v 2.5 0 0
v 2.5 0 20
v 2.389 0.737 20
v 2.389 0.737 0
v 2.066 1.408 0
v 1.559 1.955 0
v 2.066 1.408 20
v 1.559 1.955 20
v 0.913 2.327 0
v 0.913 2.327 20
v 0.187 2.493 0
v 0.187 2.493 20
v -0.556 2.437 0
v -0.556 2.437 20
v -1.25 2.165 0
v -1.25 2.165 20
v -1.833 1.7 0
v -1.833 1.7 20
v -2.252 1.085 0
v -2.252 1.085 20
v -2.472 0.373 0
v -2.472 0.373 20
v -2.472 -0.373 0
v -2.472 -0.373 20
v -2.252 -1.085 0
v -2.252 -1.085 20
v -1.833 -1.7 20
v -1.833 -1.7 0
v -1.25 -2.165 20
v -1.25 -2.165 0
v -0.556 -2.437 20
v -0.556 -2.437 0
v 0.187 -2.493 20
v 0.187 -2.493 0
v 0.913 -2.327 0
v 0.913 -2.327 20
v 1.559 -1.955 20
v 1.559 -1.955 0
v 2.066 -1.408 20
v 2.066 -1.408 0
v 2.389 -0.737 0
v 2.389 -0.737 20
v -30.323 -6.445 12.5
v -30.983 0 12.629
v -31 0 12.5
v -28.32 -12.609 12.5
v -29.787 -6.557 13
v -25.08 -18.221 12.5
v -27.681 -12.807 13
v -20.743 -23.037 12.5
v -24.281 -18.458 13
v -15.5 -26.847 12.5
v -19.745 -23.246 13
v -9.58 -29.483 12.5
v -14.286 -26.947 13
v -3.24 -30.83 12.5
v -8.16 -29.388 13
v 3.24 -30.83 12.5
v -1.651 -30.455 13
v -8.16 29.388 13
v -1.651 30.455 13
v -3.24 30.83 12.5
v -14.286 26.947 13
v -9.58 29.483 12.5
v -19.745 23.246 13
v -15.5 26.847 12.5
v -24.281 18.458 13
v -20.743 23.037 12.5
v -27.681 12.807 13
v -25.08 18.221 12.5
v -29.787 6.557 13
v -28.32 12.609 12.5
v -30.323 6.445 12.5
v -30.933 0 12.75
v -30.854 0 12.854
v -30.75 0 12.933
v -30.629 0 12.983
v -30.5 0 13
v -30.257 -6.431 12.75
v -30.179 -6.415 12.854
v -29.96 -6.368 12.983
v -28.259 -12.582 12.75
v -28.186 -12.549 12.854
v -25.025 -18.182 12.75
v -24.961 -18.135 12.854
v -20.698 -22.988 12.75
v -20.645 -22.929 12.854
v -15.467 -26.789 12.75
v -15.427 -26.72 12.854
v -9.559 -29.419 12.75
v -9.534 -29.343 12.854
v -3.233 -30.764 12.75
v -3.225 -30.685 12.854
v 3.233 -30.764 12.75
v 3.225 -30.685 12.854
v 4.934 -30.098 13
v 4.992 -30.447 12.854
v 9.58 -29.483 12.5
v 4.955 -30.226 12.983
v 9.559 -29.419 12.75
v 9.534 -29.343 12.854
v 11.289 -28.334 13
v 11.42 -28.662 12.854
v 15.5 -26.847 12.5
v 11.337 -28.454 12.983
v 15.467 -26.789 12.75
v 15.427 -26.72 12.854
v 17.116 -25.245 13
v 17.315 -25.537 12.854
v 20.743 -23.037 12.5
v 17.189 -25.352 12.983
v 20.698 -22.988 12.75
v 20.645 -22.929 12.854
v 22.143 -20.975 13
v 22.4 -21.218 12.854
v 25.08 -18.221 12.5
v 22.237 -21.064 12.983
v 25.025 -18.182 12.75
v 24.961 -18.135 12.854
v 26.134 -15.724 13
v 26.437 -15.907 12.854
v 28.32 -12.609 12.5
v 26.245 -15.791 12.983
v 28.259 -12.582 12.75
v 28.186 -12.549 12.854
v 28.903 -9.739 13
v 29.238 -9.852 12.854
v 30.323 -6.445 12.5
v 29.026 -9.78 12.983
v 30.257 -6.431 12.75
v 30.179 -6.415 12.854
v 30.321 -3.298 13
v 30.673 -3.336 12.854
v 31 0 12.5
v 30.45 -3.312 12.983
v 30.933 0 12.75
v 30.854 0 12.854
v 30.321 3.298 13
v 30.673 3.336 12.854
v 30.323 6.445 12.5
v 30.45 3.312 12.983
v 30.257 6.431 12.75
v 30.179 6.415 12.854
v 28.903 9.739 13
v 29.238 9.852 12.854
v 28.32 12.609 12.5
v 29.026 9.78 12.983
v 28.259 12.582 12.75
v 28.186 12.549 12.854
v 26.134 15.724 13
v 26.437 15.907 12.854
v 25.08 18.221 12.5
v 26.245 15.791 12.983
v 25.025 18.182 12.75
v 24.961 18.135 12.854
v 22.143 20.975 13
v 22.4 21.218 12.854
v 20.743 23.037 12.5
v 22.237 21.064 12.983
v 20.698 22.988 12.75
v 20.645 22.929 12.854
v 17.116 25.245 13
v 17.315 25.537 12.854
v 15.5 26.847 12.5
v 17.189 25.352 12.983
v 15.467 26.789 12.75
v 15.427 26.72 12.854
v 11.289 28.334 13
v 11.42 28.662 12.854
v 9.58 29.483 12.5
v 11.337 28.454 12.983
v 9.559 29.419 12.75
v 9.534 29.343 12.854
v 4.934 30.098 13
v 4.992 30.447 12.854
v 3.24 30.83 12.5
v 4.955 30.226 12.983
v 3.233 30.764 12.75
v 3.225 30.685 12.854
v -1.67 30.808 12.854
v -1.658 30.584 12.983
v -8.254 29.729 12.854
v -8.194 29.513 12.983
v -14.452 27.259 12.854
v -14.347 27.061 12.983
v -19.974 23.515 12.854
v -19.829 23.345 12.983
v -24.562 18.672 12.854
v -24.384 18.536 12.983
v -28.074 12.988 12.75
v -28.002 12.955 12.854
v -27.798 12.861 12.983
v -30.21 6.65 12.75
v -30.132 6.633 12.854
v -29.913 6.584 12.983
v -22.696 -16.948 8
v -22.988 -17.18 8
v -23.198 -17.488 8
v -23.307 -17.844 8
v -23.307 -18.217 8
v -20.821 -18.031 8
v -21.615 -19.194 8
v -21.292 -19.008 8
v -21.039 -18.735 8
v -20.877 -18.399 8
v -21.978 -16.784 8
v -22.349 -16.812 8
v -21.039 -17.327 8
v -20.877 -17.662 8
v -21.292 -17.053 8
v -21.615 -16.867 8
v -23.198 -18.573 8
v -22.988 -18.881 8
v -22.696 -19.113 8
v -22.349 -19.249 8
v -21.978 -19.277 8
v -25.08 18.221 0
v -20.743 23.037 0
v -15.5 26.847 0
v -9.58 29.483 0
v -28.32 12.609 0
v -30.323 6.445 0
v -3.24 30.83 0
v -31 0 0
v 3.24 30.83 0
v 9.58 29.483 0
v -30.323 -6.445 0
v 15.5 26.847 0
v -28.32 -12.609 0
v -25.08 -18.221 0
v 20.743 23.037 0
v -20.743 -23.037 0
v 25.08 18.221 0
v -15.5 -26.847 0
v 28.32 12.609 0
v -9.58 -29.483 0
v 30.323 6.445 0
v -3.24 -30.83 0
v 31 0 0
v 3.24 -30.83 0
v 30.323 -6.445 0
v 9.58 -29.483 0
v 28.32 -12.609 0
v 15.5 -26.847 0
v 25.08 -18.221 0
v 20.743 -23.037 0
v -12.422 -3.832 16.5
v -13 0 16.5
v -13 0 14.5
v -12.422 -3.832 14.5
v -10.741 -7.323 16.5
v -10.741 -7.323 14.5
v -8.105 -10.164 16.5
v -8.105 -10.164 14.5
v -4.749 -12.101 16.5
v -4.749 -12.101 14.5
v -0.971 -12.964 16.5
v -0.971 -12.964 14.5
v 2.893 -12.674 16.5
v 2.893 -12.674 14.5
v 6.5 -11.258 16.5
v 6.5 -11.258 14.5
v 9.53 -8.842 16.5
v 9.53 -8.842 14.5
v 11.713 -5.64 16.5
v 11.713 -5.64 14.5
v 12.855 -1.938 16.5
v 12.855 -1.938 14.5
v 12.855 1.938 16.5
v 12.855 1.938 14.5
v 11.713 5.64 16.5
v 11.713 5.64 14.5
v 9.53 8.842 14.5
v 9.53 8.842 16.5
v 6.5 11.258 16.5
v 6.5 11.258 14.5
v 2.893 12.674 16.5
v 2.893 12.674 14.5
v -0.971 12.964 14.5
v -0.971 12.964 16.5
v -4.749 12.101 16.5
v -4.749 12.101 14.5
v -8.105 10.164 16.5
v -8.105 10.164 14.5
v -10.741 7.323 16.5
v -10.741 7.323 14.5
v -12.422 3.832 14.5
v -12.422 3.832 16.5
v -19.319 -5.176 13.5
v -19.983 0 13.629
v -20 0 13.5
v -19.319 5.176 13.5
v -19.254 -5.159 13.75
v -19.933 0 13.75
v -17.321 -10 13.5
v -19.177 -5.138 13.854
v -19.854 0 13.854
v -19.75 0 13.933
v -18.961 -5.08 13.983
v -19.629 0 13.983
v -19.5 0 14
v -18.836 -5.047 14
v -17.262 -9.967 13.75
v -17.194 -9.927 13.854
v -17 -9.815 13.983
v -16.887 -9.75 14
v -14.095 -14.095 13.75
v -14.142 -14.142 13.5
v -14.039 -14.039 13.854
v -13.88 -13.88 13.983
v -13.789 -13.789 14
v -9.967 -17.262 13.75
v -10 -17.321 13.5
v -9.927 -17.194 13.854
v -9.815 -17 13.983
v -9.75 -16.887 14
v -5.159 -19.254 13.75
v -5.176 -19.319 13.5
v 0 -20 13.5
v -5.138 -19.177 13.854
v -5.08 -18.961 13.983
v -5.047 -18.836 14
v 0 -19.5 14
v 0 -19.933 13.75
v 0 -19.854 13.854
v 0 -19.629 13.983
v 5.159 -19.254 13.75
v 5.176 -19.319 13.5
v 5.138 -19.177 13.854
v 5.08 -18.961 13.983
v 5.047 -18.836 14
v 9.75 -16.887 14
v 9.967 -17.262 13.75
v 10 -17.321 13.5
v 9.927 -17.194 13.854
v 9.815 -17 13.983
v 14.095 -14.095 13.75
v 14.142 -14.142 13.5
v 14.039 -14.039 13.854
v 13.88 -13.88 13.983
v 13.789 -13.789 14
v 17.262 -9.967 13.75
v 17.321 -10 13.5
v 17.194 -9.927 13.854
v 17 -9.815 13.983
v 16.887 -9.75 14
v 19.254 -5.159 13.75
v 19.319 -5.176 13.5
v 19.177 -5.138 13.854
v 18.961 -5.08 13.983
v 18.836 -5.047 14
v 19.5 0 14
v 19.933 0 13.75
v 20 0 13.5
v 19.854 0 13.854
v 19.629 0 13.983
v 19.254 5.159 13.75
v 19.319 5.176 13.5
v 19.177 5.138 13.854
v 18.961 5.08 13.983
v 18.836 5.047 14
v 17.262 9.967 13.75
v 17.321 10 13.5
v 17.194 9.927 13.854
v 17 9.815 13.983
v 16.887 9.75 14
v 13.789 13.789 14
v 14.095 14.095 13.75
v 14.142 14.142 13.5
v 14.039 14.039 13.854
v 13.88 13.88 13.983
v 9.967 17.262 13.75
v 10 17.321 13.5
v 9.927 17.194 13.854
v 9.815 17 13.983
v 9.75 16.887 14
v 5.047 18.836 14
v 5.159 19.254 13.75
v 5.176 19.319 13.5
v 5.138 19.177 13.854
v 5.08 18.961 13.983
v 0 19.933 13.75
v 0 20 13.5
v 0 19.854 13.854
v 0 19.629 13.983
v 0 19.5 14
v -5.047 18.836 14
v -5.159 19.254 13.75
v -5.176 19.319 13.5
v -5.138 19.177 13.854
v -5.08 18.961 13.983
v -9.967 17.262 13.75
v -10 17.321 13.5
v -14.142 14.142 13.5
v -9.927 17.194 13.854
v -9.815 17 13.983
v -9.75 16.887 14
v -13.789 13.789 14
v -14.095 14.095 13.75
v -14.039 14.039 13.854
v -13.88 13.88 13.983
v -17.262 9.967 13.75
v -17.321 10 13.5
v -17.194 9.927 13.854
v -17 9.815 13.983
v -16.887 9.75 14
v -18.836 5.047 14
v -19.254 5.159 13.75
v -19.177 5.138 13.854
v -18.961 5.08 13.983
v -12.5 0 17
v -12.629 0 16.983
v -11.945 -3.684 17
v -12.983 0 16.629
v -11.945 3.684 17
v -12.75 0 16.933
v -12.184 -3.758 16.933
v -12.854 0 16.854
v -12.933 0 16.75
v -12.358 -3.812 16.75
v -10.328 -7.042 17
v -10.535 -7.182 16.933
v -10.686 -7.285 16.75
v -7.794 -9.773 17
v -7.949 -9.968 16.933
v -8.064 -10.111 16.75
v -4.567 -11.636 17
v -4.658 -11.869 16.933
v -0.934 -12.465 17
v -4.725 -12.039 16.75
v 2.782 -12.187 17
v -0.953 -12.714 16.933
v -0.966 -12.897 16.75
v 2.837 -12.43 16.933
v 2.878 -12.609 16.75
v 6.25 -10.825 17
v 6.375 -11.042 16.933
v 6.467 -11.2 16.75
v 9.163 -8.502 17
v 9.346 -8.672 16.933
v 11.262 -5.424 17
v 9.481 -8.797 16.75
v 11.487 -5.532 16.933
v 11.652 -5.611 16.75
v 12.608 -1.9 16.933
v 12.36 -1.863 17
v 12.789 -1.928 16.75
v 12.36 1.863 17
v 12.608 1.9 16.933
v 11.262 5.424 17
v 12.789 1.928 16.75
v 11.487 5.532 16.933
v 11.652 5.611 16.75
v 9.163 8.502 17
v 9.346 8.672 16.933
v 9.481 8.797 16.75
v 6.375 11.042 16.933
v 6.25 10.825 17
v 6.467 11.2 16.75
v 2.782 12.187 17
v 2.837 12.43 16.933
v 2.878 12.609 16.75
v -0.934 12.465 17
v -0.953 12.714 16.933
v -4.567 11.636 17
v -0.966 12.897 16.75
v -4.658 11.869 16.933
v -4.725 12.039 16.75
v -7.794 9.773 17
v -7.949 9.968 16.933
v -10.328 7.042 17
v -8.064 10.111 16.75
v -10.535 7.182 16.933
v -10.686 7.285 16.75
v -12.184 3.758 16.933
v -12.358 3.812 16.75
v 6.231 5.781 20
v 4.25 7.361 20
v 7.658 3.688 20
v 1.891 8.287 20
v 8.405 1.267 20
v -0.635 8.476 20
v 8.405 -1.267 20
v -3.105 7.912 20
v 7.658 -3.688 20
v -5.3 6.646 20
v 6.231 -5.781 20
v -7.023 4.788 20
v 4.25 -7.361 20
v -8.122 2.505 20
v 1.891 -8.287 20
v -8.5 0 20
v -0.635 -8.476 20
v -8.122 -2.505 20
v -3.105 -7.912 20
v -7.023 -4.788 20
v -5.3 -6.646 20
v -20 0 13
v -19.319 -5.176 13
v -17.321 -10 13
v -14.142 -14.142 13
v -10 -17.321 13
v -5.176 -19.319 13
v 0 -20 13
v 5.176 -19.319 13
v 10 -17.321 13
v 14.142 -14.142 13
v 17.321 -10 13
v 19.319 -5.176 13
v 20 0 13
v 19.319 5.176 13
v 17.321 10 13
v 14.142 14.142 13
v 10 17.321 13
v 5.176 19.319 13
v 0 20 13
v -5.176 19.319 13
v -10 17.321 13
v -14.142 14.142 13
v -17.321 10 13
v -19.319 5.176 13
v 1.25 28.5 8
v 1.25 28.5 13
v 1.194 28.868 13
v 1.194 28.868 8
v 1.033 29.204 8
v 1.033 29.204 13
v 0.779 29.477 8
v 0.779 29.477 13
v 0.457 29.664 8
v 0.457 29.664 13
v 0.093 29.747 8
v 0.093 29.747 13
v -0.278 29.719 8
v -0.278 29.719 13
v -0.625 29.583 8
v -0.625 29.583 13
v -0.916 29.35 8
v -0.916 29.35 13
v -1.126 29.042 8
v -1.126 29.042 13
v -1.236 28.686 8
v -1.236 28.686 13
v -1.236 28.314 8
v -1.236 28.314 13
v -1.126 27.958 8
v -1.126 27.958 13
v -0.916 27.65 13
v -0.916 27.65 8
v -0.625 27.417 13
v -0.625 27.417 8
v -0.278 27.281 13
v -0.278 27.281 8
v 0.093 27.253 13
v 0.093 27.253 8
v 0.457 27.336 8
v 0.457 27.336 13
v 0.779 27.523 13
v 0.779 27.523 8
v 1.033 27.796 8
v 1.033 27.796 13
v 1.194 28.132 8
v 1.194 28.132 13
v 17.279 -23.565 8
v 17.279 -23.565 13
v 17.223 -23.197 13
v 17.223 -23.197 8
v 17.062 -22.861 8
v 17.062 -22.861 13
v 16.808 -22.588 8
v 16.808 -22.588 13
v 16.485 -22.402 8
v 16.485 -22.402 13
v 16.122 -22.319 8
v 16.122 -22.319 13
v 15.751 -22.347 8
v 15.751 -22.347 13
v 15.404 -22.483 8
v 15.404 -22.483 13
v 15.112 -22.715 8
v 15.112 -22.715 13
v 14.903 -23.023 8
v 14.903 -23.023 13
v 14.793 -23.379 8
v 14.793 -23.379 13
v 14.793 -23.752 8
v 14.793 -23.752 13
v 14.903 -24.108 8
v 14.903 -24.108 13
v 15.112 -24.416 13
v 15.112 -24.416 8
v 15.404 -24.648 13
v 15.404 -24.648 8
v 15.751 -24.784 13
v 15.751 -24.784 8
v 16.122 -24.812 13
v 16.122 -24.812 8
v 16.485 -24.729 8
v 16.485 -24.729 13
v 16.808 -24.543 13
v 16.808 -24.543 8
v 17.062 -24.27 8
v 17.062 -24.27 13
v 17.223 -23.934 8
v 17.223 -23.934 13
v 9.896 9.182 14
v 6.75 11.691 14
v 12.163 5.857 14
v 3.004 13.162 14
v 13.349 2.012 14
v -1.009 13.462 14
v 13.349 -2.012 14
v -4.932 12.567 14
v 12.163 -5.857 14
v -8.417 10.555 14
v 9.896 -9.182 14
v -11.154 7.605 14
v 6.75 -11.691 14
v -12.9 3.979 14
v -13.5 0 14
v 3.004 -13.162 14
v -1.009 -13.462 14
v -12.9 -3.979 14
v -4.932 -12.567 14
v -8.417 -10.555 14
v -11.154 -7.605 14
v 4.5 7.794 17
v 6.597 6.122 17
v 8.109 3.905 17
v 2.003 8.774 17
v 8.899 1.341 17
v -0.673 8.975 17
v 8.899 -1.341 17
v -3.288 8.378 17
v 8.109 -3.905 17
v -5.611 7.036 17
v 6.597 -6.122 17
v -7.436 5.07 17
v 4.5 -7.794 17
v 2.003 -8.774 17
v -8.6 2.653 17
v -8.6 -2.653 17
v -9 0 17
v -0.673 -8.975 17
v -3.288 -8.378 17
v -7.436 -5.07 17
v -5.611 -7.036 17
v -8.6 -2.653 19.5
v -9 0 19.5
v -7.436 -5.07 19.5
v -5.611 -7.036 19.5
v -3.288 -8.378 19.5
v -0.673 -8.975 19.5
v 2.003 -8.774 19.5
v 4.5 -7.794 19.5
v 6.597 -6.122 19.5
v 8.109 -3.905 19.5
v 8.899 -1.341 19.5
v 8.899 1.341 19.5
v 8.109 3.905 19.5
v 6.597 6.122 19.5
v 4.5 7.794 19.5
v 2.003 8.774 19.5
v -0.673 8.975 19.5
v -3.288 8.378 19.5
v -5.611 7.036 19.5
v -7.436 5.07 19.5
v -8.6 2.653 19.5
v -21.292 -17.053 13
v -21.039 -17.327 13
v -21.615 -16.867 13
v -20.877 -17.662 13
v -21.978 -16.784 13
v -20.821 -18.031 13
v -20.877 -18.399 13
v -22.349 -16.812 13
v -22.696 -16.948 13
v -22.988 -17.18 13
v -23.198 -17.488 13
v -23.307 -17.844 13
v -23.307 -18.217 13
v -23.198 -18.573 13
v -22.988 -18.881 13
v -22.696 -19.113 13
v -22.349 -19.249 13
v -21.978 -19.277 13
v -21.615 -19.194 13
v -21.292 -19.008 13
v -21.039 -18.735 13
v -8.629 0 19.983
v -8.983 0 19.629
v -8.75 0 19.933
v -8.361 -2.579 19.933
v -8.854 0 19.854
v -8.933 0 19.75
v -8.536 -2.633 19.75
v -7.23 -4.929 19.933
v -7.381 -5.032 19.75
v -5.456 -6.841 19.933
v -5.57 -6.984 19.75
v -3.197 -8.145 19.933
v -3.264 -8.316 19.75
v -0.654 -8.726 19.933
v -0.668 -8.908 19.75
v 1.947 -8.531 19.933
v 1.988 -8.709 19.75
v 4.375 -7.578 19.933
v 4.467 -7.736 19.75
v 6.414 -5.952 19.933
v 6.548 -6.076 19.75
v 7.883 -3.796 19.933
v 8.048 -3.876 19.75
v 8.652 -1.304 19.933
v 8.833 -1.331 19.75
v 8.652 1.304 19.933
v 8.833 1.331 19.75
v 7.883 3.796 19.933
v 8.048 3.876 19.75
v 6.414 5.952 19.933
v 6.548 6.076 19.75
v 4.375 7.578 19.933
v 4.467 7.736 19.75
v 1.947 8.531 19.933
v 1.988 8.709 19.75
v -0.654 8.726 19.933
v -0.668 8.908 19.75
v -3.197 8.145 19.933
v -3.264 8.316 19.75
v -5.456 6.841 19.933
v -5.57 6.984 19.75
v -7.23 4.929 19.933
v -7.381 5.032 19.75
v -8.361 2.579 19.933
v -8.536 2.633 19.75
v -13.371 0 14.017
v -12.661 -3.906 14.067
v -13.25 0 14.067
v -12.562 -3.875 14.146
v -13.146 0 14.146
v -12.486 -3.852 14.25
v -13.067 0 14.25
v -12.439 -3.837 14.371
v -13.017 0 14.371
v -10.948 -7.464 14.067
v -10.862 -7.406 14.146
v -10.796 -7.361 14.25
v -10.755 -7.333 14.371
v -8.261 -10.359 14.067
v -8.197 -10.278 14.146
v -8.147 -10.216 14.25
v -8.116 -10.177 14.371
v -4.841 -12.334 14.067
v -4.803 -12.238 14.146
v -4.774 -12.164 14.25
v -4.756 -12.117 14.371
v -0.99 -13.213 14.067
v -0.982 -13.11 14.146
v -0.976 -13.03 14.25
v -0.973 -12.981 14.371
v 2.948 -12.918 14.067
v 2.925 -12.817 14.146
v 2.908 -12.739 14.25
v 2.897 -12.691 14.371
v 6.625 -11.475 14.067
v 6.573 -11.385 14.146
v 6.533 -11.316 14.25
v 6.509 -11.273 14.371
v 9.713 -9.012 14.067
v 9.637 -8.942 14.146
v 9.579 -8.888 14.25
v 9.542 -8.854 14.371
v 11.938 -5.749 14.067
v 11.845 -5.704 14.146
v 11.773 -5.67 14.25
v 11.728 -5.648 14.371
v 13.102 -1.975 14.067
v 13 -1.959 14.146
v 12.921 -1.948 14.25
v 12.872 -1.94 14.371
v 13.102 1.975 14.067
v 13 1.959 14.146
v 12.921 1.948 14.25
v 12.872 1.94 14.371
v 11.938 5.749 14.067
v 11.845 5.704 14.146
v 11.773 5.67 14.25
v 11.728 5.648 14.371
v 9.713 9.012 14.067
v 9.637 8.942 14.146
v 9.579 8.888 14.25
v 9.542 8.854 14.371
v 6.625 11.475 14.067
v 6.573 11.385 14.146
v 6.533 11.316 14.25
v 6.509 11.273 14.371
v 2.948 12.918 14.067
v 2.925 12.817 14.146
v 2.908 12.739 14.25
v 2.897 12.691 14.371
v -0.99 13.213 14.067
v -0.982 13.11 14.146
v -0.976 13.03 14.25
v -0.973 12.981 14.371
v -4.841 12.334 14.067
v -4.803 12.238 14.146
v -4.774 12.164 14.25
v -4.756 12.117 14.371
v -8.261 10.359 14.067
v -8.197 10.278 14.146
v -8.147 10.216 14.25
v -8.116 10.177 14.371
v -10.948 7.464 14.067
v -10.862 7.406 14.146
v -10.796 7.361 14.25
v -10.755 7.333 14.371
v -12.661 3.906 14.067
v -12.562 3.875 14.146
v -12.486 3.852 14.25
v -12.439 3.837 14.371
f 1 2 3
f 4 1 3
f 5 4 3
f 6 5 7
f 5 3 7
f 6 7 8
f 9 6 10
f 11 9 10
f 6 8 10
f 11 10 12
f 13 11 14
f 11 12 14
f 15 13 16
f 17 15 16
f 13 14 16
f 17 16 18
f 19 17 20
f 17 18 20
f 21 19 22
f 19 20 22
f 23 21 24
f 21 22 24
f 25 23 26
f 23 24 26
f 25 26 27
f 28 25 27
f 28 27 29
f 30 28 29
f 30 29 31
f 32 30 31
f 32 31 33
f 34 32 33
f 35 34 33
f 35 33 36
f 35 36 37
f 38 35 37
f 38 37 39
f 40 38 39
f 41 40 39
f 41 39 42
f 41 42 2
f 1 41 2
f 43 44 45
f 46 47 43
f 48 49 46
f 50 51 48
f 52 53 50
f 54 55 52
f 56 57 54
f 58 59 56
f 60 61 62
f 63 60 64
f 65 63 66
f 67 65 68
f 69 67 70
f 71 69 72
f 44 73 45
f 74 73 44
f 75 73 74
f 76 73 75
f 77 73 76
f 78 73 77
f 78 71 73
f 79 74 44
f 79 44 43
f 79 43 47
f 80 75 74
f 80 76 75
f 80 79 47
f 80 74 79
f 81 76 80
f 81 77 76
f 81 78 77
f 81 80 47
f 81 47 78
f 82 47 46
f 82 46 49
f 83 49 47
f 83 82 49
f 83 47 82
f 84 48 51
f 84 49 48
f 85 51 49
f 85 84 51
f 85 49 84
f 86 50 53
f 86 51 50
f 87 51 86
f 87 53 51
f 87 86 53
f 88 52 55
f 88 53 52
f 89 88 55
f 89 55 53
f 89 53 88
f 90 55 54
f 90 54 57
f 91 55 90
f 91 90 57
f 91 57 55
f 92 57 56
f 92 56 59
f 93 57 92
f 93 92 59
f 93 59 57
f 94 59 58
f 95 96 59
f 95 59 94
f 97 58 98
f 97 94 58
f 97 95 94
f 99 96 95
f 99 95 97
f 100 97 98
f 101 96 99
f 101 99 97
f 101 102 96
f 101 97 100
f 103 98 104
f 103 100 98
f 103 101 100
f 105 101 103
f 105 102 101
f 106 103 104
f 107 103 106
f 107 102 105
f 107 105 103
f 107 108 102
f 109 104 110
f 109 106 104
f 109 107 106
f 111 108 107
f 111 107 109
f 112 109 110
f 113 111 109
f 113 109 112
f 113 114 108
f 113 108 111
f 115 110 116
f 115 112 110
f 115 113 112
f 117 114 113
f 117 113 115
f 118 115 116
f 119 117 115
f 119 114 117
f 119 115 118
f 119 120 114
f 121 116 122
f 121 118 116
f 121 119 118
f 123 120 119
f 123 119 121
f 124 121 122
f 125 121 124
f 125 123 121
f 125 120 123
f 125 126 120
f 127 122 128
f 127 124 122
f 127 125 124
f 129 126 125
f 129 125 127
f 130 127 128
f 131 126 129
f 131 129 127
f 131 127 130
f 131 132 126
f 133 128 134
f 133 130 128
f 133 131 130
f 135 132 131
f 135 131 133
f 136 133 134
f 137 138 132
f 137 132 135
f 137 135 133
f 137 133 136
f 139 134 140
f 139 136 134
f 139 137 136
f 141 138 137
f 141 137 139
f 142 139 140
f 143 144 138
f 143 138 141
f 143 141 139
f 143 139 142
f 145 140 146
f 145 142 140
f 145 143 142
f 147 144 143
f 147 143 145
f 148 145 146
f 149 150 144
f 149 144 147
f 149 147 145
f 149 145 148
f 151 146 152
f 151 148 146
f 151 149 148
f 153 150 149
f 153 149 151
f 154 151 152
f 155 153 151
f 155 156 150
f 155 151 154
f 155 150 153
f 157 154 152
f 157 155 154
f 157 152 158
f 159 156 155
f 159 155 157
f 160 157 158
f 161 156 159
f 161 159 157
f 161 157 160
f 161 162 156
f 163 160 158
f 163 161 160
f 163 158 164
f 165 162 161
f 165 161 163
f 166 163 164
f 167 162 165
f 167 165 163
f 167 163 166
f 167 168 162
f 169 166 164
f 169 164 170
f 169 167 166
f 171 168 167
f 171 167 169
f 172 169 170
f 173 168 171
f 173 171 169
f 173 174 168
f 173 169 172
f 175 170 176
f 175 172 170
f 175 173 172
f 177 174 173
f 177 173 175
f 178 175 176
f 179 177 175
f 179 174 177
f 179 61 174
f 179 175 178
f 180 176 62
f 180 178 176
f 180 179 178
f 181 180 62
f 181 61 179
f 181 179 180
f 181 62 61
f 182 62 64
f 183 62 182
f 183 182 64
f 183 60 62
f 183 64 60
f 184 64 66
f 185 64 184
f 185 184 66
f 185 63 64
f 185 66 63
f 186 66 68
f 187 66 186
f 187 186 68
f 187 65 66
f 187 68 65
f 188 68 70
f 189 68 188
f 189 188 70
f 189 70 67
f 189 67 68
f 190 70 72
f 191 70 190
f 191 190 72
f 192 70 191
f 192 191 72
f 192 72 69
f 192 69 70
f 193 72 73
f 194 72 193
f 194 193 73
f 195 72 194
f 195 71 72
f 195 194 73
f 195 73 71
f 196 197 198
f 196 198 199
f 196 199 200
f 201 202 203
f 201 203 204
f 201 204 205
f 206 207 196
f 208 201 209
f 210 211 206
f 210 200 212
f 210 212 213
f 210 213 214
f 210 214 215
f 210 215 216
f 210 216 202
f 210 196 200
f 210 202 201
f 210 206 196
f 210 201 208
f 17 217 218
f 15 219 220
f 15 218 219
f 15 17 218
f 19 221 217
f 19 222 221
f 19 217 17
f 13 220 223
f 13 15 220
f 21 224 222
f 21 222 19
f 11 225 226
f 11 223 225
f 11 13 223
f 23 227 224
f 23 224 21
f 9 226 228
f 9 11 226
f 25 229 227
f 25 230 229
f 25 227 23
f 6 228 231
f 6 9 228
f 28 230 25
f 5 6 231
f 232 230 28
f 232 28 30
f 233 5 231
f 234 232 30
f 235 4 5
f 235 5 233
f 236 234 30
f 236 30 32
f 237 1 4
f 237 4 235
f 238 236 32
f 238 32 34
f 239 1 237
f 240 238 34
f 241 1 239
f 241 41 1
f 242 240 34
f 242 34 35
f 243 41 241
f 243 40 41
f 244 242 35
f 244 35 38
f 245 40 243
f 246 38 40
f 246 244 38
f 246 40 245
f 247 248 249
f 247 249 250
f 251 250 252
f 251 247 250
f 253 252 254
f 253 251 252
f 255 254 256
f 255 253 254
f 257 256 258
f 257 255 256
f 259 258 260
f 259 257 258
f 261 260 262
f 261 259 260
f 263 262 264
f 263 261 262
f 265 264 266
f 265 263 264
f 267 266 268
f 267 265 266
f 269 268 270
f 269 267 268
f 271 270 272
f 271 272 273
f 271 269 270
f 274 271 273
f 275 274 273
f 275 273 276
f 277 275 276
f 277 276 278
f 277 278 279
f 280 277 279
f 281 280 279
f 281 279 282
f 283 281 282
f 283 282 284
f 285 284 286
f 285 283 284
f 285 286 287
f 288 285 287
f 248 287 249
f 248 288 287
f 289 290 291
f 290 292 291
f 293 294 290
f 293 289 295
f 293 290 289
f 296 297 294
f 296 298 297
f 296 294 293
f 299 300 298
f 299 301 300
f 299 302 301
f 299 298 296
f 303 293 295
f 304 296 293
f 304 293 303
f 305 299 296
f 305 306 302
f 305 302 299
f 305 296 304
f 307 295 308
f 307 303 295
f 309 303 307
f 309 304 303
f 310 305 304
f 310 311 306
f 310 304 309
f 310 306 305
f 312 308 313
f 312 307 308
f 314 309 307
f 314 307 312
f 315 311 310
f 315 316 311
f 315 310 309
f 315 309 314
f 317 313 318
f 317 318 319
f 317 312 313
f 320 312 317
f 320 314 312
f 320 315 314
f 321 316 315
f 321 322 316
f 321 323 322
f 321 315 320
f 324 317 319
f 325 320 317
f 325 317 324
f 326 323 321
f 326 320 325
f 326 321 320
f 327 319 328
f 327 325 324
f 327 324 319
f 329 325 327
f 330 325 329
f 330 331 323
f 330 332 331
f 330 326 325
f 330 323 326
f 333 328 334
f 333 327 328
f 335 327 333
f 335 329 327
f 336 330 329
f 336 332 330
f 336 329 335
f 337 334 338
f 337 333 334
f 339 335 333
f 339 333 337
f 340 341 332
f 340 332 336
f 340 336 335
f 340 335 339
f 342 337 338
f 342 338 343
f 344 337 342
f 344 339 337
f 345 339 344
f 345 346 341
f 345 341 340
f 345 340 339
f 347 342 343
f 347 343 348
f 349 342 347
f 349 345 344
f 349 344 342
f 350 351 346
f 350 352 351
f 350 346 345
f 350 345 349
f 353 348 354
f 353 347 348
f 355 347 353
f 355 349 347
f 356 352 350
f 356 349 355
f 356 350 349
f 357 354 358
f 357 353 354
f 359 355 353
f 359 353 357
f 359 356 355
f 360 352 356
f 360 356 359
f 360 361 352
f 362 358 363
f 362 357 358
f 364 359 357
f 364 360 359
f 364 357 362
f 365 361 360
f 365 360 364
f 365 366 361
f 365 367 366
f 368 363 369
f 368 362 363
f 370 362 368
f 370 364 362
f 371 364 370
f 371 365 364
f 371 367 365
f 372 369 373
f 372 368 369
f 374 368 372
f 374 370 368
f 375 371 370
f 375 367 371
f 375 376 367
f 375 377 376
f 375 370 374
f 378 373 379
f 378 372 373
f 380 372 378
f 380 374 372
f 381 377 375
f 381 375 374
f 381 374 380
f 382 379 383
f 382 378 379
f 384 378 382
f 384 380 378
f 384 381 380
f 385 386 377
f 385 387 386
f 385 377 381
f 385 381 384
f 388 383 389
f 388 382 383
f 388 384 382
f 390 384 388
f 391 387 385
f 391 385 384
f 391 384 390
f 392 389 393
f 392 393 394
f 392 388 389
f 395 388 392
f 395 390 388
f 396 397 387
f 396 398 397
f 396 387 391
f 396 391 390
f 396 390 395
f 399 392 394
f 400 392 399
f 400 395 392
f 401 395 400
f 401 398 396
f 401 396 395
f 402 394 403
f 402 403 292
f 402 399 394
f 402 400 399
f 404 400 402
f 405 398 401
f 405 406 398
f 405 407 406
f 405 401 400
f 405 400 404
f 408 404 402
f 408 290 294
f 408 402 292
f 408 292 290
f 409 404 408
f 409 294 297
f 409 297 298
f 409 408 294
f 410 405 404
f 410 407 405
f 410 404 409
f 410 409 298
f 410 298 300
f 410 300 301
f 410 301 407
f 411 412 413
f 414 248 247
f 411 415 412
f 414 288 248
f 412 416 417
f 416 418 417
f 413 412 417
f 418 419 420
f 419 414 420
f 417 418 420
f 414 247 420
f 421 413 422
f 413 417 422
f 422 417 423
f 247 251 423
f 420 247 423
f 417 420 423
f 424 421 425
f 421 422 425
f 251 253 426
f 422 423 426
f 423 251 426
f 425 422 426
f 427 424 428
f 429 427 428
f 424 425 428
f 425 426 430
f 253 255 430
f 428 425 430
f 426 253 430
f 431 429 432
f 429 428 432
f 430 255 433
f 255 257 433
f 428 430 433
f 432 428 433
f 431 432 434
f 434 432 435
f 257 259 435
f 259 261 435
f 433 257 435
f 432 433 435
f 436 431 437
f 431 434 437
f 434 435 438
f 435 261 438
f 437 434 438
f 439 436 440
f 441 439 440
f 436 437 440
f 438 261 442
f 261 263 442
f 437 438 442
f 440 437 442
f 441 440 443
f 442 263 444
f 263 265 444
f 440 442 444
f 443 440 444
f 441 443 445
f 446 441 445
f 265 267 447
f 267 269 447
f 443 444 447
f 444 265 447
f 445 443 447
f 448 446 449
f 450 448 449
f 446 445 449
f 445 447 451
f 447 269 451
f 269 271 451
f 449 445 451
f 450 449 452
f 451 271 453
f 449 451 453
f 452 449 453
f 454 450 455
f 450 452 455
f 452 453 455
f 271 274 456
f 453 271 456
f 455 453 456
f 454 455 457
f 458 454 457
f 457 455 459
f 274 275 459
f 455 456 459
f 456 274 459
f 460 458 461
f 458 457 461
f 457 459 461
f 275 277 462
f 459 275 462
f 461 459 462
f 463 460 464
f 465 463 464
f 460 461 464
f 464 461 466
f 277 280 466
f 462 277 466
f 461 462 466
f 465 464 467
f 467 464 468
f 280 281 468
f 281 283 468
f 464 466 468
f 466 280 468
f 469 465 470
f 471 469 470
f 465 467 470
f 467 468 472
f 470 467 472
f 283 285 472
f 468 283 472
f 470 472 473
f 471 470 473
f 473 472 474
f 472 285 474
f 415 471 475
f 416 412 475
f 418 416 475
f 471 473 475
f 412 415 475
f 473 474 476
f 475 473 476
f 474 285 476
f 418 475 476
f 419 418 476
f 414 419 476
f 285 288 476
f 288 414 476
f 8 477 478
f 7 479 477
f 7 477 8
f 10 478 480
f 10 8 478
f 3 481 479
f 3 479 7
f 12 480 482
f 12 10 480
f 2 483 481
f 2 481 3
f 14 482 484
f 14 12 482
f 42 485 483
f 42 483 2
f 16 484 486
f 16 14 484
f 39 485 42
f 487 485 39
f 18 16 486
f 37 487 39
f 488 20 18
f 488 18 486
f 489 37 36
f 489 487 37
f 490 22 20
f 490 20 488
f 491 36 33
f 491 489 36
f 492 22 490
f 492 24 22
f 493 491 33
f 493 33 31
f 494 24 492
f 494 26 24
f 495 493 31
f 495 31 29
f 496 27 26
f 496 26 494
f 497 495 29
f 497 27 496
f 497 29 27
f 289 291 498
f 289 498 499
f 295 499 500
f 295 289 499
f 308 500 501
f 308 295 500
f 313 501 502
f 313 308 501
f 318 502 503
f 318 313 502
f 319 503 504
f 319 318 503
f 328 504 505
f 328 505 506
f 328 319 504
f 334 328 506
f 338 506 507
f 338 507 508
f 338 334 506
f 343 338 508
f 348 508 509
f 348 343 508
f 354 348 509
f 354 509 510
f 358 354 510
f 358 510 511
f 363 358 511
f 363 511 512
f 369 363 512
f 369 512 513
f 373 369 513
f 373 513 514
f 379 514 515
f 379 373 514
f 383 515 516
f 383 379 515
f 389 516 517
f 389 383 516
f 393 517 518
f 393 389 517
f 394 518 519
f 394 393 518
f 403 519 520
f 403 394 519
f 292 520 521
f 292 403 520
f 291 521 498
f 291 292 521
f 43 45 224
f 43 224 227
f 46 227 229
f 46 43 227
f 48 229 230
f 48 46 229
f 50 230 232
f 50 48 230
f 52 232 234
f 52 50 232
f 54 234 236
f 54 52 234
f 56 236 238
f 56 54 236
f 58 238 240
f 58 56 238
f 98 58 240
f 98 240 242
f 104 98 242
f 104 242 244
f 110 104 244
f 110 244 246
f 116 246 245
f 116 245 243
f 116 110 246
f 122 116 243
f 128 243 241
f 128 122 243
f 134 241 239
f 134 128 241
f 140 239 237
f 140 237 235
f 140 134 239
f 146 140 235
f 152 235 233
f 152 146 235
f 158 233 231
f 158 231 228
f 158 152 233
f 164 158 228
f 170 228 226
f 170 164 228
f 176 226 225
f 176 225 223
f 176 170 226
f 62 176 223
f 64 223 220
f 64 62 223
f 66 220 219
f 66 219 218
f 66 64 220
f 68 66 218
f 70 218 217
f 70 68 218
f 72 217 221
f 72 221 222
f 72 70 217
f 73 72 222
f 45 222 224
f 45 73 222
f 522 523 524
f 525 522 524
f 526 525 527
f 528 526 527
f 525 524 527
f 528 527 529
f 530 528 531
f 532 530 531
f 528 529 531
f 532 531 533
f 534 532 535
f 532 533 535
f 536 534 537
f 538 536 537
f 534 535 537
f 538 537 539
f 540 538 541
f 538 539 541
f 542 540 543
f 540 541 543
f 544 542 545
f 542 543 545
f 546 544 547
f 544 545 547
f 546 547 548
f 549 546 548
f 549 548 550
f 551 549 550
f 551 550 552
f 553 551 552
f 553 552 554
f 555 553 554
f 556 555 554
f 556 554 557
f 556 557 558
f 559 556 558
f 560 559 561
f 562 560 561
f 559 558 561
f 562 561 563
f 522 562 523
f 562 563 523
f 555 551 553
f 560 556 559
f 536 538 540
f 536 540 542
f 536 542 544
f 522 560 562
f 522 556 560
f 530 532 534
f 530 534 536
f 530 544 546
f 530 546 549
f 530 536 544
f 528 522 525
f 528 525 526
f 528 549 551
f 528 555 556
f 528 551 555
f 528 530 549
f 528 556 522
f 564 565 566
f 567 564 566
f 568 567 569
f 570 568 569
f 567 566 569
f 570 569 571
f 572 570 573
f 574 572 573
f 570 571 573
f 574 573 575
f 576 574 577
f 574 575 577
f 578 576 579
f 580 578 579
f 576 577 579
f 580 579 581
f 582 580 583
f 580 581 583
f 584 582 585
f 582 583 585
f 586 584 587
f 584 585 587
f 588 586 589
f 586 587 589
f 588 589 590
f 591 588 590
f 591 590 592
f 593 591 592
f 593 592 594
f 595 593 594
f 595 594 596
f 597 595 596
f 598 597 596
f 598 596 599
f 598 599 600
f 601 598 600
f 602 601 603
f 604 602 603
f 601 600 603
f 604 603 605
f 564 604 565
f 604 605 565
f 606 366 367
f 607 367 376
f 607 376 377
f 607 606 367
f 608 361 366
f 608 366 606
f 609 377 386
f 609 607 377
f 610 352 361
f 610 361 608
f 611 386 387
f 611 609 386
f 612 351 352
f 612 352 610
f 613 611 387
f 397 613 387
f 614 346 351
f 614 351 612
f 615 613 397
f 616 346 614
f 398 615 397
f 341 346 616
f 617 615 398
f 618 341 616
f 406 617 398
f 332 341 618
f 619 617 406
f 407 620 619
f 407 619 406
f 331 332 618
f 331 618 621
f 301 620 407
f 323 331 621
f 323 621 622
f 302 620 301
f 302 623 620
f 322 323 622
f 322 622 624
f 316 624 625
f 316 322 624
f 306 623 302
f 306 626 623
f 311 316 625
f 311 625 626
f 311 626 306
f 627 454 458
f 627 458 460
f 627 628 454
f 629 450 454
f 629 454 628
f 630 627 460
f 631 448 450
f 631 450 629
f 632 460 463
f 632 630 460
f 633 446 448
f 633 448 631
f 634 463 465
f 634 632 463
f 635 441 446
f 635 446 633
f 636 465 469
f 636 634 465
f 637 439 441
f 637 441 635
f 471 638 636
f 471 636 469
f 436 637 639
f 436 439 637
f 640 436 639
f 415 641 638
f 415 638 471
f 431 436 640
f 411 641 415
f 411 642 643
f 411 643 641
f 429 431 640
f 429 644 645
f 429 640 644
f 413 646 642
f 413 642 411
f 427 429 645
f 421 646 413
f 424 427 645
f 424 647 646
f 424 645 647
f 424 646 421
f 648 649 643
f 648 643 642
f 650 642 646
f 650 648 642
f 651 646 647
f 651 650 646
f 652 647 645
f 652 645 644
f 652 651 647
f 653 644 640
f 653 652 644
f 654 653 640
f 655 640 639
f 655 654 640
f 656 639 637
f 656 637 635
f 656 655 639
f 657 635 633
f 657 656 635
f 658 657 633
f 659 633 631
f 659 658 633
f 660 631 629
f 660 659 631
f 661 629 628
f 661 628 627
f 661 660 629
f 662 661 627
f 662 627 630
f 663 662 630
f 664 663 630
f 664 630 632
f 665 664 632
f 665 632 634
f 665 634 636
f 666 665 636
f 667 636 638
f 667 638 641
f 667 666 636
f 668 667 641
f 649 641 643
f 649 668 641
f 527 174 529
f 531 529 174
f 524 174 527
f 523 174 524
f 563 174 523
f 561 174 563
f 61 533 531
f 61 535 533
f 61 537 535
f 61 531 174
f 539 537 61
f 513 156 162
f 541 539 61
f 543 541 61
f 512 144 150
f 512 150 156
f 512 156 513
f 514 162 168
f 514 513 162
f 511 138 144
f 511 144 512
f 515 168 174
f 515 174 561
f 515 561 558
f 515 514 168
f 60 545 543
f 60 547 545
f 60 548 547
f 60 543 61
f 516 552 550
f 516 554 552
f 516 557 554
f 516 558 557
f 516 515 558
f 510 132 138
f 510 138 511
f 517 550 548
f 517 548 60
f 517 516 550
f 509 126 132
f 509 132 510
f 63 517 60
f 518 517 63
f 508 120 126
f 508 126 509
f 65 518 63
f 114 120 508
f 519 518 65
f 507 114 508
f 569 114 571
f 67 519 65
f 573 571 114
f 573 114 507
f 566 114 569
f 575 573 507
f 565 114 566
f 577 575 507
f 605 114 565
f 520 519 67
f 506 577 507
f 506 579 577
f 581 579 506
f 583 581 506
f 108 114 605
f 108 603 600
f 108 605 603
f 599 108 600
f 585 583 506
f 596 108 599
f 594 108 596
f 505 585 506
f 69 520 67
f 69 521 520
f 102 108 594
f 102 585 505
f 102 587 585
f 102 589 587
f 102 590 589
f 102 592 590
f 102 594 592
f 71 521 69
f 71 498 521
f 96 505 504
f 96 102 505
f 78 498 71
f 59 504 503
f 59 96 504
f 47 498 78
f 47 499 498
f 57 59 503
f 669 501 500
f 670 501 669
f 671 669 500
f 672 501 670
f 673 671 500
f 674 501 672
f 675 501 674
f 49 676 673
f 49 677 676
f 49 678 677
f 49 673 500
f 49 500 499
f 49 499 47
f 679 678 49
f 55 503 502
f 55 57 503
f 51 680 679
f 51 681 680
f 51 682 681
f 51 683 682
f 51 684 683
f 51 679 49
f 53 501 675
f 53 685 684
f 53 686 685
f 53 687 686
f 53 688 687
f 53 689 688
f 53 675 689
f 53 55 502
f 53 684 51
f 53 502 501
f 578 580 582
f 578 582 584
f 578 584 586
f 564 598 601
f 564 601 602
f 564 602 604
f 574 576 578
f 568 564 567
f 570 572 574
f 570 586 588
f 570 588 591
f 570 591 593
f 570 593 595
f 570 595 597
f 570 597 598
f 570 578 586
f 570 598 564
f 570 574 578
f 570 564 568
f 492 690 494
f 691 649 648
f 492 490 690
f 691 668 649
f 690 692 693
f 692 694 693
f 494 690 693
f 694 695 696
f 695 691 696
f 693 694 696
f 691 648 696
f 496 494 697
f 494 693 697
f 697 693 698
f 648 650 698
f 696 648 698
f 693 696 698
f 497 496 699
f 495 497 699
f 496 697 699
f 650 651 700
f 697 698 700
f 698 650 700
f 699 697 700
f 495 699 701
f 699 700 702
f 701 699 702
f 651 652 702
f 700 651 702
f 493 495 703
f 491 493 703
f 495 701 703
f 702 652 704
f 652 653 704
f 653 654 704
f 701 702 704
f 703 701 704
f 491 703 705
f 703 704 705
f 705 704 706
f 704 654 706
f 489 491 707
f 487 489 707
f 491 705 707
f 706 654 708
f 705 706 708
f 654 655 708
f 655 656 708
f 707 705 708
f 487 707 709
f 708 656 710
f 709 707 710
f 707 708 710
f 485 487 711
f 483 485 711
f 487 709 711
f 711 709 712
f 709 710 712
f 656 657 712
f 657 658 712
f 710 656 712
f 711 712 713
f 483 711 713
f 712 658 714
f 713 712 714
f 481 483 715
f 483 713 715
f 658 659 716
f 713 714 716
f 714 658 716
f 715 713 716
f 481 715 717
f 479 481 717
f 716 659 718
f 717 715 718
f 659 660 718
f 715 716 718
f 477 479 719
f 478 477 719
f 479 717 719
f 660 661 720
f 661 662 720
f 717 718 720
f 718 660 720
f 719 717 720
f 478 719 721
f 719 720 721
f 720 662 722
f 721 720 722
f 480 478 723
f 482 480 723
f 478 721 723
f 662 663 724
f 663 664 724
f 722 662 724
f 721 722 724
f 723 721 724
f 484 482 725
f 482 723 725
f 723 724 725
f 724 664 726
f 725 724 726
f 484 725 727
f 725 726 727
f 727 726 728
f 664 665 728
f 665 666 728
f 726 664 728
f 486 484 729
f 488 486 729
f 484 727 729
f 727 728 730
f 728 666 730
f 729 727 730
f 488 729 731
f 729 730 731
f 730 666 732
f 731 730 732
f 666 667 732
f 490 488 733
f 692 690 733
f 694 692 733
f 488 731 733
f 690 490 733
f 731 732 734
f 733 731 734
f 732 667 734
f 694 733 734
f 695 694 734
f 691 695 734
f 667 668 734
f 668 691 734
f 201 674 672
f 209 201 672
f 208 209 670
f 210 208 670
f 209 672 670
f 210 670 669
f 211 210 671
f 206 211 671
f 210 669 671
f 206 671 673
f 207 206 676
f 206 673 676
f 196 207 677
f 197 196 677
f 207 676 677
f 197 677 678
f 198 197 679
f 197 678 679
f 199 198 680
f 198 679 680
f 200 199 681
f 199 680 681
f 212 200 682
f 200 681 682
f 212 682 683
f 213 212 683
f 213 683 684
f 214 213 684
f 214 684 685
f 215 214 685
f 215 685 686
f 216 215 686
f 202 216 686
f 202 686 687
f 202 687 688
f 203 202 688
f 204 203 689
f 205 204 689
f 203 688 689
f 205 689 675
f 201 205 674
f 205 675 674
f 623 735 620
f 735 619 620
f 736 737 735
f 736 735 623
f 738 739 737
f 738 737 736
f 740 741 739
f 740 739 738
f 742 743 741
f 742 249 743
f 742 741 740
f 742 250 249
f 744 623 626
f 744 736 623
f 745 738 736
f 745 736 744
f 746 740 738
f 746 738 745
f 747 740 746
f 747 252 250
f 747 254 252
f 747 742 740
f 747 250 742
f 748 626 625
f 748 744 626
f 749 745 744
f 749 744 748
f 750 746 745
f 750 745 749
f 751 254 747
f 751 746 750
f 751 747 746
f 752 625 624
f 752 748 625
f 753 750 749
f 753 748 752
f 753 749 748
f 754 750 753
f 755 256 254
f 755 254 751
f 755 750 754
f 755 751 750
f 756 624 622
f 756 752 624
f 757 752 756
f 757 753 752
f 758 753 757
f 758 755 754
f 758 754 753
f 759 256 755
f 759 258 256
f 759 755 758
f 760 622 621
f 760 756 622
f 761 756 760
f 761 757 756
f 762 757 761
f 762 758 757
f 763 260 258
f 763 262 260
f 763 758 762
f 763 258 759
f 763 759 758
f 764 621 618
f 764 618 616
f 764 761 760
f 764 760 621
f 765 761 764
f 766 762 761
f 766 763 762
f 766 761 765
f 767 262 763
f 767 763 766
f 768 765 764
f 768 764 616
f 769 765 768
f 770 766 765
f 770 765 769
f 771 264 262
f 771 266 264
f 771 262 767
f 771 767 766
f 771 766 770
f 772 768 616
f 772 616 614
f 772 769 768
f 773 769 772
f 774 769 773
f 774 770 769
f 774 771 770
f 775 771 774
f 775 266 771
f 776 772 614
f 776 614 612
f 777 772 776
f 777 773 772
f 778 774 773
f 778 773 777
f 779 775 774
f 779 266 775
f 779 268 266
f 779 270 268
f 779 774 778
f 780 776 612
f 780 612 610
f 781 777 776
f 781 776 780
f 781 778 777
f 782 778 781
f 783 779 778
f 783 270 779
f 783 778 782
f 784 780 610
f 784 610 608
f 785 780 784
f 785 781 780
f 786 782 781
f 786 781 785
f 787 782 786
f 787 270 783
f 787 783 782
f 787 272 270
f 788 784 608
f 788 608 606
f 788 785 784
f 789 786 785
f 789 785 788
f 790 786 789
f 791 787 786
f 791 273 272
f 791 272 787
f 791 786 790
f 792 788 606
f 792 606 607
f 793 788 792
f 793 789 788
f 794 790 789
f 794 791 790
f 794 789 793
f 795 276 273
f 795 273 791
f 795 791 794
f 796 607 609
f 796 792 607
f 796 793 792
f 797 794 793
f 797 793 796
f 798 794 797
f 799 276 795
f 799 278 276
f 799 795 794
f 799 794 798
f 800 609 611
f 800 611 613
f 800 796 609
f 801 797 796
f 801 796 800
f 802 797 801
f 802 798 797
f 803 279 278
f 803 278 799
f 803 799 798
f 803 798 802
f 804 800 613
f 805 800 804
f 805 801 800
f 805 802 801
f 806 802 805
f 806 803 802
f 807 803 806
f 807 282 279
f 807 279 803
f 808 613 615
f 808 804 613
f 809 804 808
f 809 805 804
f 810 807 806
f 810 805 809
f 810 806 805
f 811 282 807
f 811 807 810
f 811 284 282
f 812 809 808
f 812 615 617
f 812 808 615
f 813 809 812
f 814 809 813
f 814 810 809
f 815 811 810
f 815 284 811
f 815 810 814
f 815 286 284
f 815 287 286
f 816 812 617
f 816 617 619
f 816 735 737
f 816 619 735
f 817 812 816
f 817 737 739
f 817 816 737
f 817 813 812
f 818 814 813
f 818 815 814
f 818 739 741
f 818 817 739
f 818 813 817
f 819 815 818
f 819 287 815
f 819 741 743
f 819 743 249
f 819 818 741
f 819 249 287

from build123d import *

# Parameters (mm, degrees)
ESQUISSE2_R             = 2.5
ENL_V_MAT_EXTRU_1_DEPTH = 49.187135213
CONG_1_R                = 0.5
ESQUISSE3_R             = 1.25
ENL_V_MAT_EXTRU_2_DEPTH = 5


with BuildPart() as part:
    # Esquisse1 → Révolution1 (revolve)
    with BuildSketch(Plane(origin=(0, 0, 0), x_dir=(1, 0, 0), z_dir=(0, 1, 0)), mode=Mode.PRIVATE) as r_volution1_sk:
        Polygon((0, 0), (31, 0), (31, -13), (20, -13), (20, -14), (13, -14), (13, -17), (9, -17), (9, -20), (0, -20), align=None)
    revolve(r_volution1_sk.sketch.rotate(Axis((0, 0, 0), (0, 0, 1)), 180), axis=Axis((0, 0, 0), (0, 0, 1)))

    # Esquisse2 → Enlèv. mat.-Extru.1 (cut, through all)
    with BuildSketch(Plane.XY.offset(20)):
        Circle(ESQUISSE2_R)
    extrude(amount=-ENL_V_MAT_EXTRU_1_DEPTH, mode=Mode.SUBTRACT)

    # Congé1
    cong_1_edges = [part.edges().sort_by_distance(p)[0] for p in [
        (9, 0, 20),
        (13, 0, 17),
        (13, 0, 14),
        (20, 0, 14),
        (31, 0, 13),
    ]]
    fillet(cong_1_edges, radius=CONG_1_R)

    # Esquisse3 → Enlèv. mat.-Extru.2 (cut)
    with BuildSketch(Plane.XY.offset(13)):
        with Locations((0, 28.5)):
            Circle(ESQUISSE3_R)
        with Locations((-22.07133422, -18.030701754)):
            Circle(ESQUISSE3_R)
        with Locations((16.028756412, -23.565418899)):
            Circle(ESQUISSE3_R)
    extrude(amount=-ENL_V_MAT_EXTRU_2_DEPTH, mode=Mode.SUBTRACT)


solid = part.part
